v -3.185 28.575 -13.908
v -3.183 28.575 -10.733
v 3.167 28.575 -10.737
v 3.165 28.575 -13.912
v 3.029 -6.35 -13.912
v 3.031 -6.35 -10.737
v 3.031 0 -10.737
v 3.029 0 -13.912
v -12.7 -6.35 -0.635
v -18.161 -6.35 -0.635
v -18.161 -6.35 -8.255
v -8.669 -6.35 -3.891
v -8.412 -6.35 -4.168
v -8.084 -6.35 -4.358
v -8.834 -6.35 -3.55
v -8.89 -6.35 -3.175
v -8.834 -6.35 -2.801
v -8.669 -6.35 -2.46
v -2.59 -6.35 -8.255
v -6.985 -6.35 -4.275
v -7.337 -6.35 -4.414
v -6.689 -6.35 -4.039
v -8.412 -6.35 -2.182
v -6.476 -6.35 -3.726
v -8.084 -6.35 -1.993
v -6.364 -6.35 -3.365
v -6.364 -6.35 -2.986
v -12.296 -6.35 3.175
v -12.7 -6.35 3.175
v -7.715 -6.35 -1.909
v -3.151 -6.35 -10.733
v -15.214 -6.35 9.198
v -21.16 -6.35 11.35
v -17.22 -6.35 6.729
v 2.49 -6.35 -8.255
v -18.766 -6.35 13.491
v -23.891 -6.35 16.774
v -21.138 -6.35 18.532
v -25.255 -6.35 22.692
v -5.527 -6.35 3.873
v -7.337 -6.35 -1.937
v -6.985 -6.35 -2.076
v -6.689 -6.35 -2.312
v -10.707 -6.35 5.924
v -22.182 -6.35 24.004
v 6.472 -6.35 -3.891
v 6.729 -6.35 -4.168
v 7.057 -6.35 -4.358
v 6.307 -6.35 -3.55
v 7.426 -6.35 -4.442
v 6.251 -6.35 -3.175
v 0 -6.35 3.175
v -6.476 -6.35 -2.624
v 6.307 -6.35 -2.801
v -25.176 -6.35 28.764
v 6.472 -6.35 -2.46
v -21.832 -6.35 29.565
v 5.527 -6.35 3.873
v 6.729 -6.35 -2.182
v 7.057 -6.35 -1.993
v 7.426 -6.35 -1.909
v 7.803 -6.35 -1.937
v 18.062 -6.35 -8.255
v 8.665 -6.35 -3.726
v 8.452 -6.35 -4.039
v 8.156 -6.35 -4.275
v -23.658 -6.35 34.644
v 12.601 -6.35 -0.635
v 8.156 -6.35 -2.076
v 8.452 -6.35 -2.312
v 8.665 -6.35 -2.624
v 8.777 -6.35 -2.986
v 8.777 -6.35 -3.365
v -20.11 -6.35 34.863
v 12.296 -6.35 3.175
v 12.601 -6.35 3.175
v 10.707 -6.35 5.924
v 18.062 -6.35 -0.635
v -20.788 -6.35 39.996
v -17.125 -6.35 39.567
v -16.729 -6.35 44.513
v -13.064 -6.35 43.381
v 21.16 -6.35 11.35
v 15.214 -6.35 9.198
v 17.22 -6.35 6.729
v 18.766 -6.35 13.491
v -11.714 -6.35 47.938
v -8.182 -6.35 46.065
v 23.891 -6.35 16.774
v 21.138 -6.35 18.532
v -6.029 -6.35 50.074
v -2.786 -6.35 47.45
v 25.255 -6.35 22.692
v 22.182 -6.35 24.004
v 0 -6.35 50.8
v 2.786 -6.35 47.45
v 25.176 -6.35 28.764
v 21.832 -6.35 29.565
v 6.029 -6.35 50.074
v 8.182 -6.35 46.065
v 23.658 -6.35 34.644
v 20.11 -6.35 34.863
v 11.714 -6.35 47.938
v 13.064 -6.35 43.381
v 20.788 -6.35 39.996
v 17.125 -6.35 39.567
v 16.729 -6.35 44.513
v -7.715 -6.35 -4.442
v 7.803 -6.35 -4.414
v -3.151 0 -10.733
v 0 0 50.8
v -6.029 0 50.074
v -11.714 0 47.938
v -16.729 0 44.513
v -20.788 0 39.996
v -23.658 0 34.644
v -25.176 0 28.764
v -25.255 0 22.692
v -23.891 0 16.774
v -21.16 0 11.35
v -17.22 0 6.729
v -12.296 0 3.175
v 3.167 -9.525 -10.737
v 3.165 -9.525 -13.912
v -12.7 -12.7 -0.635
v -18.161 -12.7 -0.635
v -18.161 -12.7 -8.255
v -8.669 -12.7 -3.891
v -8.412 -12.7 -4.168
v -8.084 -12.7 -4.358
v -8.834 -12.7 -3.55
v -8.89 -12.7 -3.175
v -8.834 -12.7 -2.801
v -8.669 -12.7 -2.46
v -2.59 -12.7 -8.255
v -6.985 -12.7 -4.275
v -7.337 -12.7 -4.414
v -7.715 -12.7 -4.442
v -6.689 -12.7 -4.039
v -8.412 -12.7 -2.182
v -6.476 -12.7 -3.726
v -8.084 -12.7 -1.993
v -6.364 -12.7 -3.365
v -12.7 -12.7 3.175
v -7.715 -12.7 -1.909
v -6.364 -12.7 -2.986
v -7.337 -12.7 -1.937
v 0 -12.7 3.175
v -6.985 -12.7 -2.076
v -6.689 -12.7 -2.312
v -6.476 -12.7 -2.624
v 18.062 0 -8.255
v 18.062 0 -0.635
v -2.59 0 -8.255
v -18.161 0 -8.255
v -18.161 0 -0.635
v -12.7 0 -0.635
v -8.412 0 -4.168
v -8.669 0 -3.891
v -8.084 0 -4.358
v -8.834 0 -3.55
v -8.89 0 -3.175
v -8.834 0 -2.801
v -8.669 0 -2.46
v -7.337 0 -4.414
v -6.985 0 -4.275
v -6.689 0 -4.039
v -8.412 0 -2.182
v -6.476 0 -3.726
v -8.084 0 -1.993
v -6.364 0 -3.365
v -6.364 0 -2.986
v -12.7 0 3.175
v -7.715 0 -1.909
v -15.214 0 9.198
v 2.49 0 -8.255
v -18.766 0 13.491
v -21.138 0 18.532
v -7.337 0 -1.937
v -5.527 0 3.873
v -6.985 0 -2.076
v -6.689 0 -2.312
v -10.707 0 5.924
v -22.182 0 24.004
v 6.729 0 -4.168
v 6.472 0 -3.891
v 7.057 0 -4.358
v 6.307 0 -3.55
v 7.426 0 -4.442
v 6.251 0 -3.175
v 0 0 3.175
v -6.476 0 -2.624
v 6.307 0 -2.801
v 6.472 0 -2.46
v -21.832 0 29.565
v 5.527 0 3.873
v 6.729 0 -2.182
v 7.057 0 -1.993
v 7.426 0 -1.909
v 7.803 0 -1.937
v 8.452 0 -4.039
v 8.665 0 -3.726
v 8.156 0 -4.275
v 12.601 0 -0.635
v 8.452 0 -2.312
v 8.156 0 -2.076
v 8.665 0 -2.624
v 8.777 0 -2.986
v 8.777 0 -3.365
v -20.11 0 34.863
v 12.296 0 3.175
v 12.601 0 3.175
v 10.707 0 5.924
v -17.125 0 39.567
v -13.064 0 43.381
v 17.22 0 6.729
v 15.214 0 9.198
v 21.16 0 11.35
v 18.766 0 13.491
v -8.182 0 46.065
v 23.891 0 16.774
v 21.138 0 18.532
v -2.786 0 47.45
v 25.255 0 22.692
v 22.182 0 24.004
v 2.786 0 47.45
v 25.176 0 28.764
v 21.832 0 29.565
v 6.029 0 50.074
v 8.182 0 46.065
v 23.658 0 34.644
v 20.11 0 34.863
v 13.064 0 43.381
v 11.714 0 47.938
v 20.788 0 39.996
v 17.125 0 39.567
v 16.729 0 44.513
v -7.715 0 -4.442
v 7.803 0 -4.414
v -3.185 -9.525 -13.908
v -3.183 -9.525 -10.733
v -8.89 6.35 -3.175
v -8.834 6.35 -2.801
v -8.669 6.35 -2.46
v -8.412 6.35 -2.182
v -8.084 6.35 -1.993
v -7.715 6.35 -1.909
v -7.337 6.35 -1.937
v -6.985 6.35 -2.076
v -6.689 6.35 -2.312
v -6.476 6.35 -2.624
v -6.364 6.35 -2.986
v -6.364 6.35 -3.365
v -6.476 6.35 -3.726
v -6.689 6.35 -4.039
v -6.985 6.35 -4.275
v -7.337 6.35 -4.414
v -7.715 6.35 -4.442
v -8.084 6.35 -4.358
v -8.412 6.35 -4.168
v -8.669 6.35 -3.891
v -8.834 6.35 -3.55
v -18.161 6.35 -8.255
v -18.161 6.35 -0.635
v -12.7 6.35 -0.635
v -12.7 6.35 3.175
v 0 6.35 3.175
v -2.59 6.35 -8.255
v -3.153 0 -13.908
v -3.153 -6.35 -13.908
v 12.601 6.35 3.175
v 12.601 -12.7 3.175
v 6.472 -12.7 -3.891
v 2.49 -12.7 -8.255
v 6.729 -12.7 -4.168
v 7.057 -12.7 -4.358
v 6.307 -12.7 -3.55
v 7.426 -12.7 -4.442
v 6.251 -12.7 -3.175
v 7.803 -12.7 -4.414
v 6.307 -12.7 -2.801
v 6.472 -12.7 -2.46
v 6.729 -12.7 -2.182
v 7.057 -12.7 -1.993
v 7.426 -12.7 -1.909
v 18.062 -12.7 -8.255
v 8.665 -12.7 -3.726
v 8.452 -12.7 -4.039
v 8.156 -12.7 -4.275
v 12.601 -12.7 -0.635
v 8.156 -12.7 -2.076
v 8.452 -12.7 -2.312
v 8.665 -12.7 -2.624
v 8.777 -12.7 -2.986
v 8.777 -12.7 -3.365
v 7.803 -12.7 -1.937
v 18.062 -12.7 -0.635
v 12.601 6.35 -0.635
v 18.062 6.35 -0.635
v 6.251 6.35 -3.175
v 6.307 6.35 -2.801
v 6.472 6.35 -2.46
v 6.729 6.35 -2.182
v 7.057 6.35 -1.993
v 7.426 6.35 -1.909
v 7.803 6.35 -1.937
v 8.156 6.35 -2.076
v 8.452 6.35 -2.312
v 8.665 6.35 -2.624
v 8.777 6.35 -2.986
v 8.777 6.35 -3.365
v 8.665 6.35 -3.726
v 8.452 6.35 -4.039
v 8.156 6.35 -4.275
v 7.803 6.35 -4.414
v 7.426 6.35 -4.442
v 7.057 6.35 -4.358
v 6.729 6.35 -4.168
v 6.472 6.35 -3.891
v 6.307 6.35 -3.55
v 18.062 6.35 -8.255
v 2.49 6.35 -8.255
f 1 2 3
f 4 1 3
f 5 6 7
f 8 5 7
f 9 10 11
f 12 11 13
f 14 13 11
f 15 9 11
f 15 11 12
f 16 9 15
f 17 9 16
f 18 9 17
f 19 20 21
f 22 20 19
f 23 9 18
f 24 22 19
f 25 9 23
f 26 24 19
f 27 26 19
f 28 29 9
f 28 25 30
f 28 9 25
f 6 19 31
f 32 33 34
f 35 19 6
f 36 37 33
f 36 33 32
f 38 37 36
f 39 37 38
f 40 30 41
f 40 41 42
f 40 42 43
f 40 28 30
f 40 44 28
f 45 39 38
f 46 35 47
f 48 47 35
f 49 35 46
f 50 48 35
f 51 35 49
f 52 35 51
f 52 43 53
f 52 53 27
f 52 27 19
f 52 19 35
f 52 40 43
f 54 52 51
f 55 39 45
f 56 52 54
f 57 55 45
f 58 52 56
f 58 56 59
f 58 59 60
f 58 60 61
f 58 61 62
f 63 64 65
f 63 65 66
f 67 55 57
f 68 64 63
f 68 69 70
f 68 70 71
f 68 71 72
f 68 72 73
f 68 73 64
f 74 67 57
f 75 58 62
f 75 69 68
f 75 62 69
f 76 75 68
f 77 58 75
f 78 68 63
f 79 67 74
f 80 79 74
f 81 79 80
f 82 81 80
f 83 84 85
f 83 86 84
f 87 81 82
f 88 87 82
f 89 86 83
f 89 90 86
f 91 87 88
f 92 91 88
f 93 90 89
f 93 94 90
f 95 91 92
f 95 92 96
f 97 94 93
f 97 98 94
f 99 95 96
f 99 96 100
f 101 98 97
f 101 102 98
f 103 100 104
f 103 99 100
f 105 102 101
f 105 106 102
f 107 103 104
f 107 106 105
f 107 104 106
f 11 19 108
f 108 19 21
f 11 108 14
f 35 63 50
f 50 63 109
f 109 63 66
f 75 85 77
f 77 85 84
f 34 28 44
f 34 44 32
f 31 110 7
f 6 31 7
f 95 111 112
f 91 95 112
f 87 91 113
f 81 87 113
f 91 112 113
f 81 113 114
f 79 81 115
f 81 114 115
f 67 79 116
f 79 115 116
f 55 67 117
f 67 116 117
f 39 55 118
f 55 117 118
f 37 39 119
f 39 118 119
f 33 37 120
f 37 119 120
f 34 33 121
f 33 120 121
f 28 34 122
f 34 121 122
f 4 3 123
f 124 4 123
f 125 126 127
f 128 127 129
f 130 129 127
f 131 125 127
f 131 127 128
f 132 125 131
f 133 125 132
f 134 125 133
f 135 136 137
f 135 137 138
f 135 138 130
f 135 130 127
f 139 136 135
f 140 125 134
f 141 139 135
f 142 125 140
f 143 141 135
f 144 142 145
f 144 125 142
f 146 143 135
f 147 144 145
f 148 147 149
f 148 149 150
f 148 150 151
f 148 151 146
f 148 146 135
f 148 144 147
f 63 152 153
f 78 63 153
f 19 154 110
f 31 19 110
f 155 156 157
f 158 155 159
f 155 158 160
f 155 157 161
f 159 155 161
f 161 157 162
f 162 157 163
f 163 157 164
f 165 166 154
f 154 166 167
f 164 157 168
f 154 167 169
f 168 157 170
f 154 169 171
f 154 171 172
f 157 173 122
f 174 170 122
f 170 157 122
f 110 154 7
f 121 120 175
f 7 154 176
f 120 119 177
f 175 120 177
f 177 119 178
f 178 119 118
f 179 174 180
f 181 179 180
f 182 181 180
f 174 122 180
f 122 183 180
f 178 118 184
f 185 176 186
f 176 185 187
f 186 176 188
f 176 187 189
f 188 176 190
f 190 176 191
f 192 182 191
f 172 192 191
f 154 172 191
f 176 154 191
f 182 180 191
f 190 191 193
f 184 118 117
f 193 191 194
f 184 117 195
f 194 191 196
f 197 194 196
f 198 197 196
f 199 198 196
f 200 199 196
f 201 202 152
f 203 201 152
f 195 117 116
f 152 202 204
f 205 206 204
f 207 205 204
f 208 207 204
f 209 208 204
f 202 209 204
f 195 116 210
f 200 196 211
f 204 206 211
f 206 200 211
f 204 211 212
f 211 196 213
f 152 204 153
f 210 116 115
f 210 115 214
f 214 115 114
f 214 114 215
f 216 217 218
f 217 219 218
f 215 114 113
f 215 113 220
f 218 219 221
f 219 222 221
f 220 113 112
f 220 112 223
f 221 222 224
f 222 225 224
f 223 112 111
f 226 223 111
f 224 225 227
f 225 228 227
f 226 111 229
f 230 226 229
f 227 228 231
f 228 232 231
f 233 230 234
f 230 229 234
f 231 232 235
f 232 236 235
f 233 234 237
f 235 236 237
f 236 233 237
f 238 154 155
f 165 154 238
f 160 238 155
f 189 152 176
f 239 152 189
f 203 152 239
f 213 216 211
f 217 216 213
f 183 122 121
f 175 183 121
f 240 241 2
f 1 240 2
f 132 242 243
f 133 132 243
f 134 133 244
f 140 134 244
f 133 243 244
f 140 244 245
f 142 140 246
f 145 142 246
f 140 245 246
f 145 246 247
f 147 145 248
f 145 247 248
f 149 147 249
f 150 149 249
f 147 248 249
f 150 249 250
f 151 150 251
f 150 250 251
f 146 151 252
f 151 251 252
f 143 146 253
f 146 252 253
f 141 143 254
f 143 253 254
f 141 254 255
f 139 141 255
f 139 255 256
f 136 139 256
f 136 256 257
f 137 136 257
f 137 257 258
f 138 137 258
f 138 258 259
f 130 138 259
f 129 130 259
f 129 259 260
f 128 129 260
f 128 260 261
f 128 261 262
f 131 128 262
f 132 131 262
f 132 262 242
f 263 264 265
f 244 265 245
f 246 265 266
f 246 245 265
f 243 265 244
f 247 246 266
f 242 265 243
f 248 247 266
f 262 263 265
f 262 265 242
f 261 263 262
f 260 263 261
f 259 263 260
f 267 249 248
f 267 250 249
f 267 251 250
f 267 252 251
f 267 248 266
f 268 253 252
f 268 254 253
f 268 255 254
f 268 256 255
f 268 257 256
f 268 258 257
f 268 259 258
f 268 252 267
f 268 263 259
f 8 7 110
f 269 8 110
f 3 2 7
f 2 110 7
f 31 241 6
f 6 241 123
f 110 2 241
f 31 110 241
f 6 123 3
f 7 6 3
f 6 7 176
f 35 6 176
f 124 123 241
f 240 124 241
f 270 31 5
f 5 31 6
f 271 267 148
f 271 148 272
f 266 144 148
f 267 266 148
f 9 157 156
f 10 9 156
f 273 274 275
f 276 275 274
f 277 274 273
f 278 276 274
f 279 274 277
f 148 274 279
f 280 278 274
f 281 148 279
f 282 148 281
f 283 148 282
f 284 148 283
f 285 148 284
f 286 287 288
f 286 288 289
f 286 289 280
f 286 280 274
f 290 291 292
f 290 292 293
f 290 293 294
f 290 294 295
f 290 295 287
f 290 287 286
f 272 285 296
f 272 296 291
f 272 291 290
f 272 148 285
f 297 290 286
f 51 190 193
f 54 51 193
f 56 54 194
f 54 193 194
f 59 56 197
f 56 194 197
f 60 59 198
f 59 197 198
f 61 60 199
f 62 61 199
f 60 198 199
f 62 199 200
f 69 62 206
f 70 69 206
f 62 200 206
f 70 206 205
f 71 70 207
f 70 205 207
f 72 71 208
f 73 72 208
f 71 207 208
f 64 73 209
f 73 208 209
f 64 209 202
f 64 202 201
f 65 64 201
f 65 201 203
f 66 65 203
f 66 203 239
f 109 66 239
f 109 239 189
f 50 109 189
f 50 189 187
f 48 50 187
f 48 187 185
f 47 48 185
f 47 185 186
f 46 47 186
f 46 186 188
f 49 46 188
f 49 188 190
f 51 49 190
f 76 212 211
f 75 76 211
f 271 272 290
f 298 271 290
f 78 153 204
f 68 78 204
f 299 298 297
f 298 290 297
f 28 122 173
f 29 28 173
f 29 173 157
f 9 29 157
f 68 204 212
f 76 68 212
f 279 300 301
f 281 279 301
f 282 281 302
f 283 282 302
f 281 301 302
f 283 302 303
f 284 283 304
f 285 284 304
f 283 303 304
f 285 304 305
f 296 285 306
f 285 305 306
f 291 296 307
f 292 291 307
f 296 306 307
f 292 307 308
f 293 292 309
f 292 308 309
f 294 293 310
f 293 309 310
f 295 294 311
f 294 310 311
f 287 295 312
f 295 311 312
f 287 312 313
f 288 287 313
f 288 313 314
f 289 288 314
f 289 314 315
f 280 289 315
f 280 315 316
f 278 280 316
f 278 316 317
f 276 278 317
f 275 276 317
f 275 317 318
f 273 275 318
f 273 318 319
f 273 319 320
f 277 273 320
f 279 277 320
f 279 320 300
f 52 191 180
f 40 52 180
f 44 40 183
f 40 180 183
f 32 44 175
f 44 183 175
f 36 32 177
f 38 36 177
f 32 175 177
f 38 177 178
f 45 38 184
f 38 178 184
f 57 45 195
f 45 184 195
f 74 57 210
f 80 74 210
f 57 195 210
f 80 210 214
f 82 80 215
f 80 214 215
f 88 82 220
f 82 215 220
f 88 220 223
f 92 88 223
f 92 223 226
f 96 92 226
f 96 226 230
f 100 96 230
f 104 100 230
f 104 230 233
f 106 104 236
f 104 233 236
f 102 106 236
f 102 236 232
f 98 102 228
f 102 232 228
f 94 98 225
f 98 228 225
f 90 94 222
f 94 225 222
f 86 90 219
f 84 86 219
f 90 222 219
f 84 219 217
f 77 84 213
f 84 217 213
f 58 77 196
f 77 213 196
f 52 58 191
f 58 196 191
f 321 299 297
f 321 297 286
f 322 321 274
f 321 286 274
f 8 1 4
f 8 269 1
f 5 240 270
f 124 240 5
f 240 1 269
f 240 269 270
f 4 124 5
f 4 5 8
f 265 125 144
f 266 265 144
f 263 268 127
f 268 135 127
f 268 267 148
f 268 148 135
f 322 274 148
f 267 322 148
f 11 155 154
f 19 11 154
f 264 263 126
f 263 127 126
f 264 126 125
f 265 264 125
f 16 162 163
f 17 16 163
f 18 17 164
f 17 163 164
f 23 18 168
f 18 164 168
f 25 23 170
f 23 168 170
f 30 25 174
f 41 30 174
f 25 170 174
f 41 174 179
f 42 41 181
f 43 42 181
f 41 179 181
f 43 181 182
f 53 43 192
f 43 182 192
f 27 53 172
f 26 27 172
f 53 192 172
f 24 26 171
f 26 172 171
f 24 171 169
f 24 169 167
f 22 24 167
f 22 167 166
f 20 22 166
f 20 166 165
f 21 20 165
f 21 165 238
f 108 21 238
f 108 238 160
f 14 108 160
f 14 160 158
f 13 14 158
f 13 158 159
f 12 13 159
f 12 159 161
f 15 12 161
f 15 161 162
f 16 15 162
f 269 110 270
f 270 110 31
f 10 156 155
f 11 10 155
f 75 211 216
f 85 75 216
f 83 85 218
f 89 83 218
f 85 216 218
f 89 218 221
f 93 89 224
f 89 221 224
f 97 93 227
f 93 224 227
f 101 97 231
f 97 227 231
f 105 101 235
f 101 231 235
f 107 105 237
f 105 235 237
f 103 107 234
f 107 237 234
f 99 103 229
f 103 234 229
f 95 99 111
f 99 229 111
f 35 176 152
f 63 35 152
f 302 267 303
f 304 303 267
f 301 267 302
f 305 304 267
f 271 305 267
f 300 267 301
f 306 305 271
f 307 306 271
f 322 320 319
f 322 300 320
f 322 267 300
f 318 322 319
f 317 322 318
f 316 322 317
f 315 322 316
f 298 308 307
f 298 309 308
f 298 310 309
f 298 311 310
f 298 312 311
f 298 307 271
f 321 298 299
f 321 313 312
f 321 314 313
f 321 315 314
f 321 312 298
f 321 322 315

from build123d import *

# Parameters (mm, degrees)
F1_DEPTH   = 12.7
F2_DEPTH   = 6.35
F3_DEPTH   = 6.35
F5_DEPTH   = 3.175
F8_D       = 2.54
F8_DEPTH   = 25.4
F8_TIP     = 0.7630929862
F8_2_D     = 2.54
F8_2_DEPTH = 25.4
F8_2_TIP   = 0.7630929862
F9_D       = 2.54
F9_DEPTH   = 25.4
F9_TIP     = 0.7630929862
F9_2_D     = 2.54
F9_2_DEPTH = 25.4
F9_2_TIP   = 0.7630929862


with BuildPart() as f1:
    # F0 (on Front) → F1 (new body)
    with BuildSketch(Plane.XZ):
        with BuildLine():
            Line((12.6008983988, 3.1746178865), (12.29603147, 3.1746178865))
            ThreePointArc((12.29603147, 3.1746178865), (7.7922258762, 1.2247809546), (2.9975086375, 0.1774913625))
            Line((2.9975086375, 0.1774913625), (0, 3.1746178865))
            Line((0, 3.1746178865), (2.4904491994, -8.2553821135))
            Line((2.4904491994, -8.2553821135), (18.0618983988, -8.2553821135))
            Line((18.0618983988, -8.2553821135), (18.0618983988, -0.6353821135))
            Line((18.0618983988, -0.6353821135), (12.6008983988, -0.6353821135))
            Line((12.6008983988, -0.6353821135), (12.6008983988, 3.1746178865))
        make_face()
        with BuildLine():
            ThreePointArc((2.9975086375, 0.1774913625), (7.7922258762, 1.2247809546), (12.29603147, 3.1746178865))
            Line((12.29603147, 3.1746178865), (0, 3.1746178865))
            Line((0, 3.1746178865), (2.9975086375, 0.1774913625))
        make_face()
    extrude(amount=F1_DEPTH)



with BuildPart() as f1b:
    # F0 (on Front) → F1, piece 2 (new body)
    with BuildSketch(Plane.XZ):
        with BuildLine():
            ThreePointArc((-2.9975086375, 0.1774913625), (-7.7922258762, 1.2247809546), (-12.29603147, 3.1746178865))
            Line((-12.29603147, 3.1746178865), (-12.7, 3.1746178865))
            Line((-12.7, 3.1746178865), (-12.7, -0.6353821135))
            Line((-12.7, -0.6353821135), (-18.161, -0.6353821135))
            Line((-18.161, -0.6353821135), (-18.161, -8.2553821135))
            Line((-18.161, -8.2553821135), (-2.5895508006, -8.2553821135))
            Line((-2.5895508006, -8.2553821135), (0, 3.1746178865))
            Line((0, 3.1746178865), (-2.9975086375, 0.1774913625))
        make_face()
        with BuildLine():
            Line((0, 3.1746178865), (-12.29603147, 3.1746178865))
            ThreePointArc((-12.29603147, 3.1746178865), (-7.7922258762, 1.2247809546), (-2.9975086375, 0.1774913625))
            Line((-2.9975086375, 0.1774913625), (0, 3.1746178865))
        make_face()
    extrude(amount=F1_DEPTH)


with BuildPart() as f1_1:
    add(f1.part)

    add(f1b.part)  # F2 merges F1b
    # F1_face (on face) → F2 (join)
    with BuildSketch(Plane(origin=(8.9471233845, 0, -2.8446774946), x_dir=(1, 0, 0), z_dir=(0, 1, 0))):
        Polygon((3.6537750143, -6.0192953811), (3.6537750143, -2.2092953811), (9.1147750143, -2.2092953811), (9.1147750143, 5.4107046189), (-6.4566741851, 5.4107046189), (-8.9471233845, -6.0192953811), align=None)
        Polygon((-21.6471233845, -2.2092953811), (-21.6471233845, -6.0192953811), (-8.9471233845, -6.0192953811), (-11.5366741851, 5.4107046189), (-27.1081233845, 5.4107046189), (-27.1081233845, -2.2092953811), align=None)
    extrude(amount=F2_DEPTH)

    # F8
    with Locations(Plane.XZ.offset(12.7)):
        with Locations((-7.62, -3.1753821135)):
            Hole(F8_D / 2, depth=F8_DEPTH)
            with Locations((0, 0, -(F8_DEPTH + F8_TIP / 2))):  # 118° drill point
                Cone(0, F8_D / 2, F8_TIP, mode=Mode.SUBTRACT)

    # F9
    with Locations(Plane.XZ.offset(12.7)):
        with Locations((7.5208983988, -3.1753821135)):
            Hole(F9_D / 2, depth=F9_DEPTH)
            with Locations((0, 0, -(F9_DEPTH + F9_TIP / 2))):  # 118° drill point
                Cone(0, F9_D / 2, F9_TIP, mode=Mode.SUBTRACT)


with BuildPart() as f3:
    # F0 (on Front) → F3 (new body)
    with BuildSketch(Plane.XZ):
        with BuildLine():
            ThreePointArc((12.29603147, 3.1746178865), (24.5935429095, 31.749617875), (0, 50.8))
            add(Edge.make_bspline(
                [(0, 50.8), (0.7272849168, 50.2708160224), (2.1817833798, 49.2123954852), (0.7272373343, 48.1545314692), (0, 47.6253821135)],
                knots=[0, 0, 0, 0, 0.5000163567, 1, 1, 1, 1], degree=3))
            ThreePointArc((0, 47.6253821135), (22.2253821135, 25.4), (0, 3.1746178865))
            Line((0, 3.1746178865), (12.29603147, 3.1746178865))
        make_face()
        with BuildLine():
            add(Edge.make_bspline(
                [(0, 50.8), (0.7272849168, 50.2708160224), (2.1817833798, 49.2123954852), (0.7272373343, 48.1545314692), (0, 47.6253821135)],
                knots=[0, 0, 0, 0, 0.5000163567, 1, 1, 1, 1], degree=3))
            ThreePointArc((0, 50.8), (-24.5935429095, 31.749617875), (-12.29603147, 3.1746178865))
            Line((-12.29603147, 3.1746178865), (0, 3.1746178865))
            ThreePointArc((0, 3.1746178865), (-22.2253821135, 25.4), (0, 47.6253821135))
        make_face()
        with BuildLine():
            Line((12.6008983988, 3.1746178865), (12.29603147, 3.1746178865))
            ThreePointArc((12.29603147, 3.1746178865), (7.7922258762, 1.2247809546), (2.9975086375, 0.1774913625))
            Line((2.9975086375, 0.1774913625), (0, 3.1746178865))
            Line((0, 3.1746178865), (2.4904491994, -8.2553821135))
            Line((2.4904491994, -8.2553821135), (18.0618983988, -8.2553821135))
            Line((18.0618983988, -8.2553821135), (18.0618983988, -0.6353821135))
            Line((18.0618983988, -0.6353821135), (12.6008983988, -0.6353821135))
            Line((12.6008983988, -0.6353821135), (12.6008983988, 3.1746178865))
        make_face()
        with BuildLine():
            ThreePointArc((2.9975086375, 0.1774913625), (7.7922258762, 1.2247809546), (12.29603147, 3.1746178865))
            Line((12.29603147, 3.1746178865), (0, 3.1746178865))
            Line((0, 3.1746178865), (2.9975086375, 0.1774913625))
        make_face()
        with BuildLine():
            Line((0, 3.1746178865), (-12.29603147, 3.1746178865))
            ThreePointArc((-12.29603147, 3.1746178865), (-7.7922258762, 1.2247809546), (-2.9975086375, 0.1774913625))
            Line((-2.9975086375, 0.1774913625), (0, 3.1746178865))
        make_face()
        with BuildLine():
            ThreePointArc((-2.9975086375, 0.1774913625), (-7.7922258762, 1.2247809546), (-12.29603147, 3.1746178865))
            Line((-12.29603147, 3.1746178865), (-12.7, 3.1746178865))
            Line((-12.7, 3.1746178865), (-12.7, -0.6353821135))
            Line((-12.7, -0.6353821135), (-18.161, -0.6353821135))
            Line((-18.161, -0.6353821135), (-18.161, -8.2553821135))
            Line((-18.161, -8.2553821135), (-2.5895508006, -8.2553821135))
            Line((-2.5895508006, -8.2553821135), (0, 3.1746178865))
            Line((0, 3.1746178865), (-2.9975086375, 0.1774913625))
        make_face()
        Polygon((2.4904491994, -8.2553821135), (0, 3.1746178865), (-2.5895508006, -8.2553821135), (-3.1507832271, -10.7326019591), (3.0311952883, -10.737154397), align=None)
    extrude(amount=F3_DEPTH)

    # F4 (on face) → F5 (join)
    with BuildSketch(Plane(origin=(-0.0079052427, 0, -10.7349163891), x_dir=(0.9999997289, 0, -0.0007364045), z_dir=(-0.0007364045, 0, -0.9999997289))):
        Polygon((3.175, -3.175), (3.175, 9.525), (-3.175, 9.525), (-3.175, -3.175), (-3.175, -28.575), (3.175, -28.575), align=None)
        Polygon((3.039101355, 0), (0, 0), (-3.1428788366, 0), (-3.1428788366, 6.35), (0, 6.35), (3.039101355, 6.35), align=None, mode=Mode.SUBTRACT)
    extrude(amount=F5_DEPTH)

    # F8#2
    with Locations(Plane.XZ.offset(12.7)):
        with Locations((-7.62, -3.1753821135)):
            Hole(F8_2_D / 2, depth=F8_2_DEPTH)
            with Locations((0, 0, -(F8_2_DEPTH + F8_2_TIP / 2))):  # 118° drill point
                Cone(0, F8_2_D / 2, F8_2_TIP, mode=Mode.SUBTRACT)

    # F9#2
    with Locations(Plane.XZ.offset(12.7)):
        with Locations((7.5208983988, -3.1753821135)):
            Hole(F9_2_D / 2, depth=F9_2_DEPTH)
            with Locations((0, 0, -(F9_2_DEPTH + F9_2_TIP / 2))):  # 118° drill point
                Cone(0, F9_2_D / 2, F9_2_TIP, mode=Mode.SUBTRACT)


solid = Compound([f1_1.part, f3.part])
